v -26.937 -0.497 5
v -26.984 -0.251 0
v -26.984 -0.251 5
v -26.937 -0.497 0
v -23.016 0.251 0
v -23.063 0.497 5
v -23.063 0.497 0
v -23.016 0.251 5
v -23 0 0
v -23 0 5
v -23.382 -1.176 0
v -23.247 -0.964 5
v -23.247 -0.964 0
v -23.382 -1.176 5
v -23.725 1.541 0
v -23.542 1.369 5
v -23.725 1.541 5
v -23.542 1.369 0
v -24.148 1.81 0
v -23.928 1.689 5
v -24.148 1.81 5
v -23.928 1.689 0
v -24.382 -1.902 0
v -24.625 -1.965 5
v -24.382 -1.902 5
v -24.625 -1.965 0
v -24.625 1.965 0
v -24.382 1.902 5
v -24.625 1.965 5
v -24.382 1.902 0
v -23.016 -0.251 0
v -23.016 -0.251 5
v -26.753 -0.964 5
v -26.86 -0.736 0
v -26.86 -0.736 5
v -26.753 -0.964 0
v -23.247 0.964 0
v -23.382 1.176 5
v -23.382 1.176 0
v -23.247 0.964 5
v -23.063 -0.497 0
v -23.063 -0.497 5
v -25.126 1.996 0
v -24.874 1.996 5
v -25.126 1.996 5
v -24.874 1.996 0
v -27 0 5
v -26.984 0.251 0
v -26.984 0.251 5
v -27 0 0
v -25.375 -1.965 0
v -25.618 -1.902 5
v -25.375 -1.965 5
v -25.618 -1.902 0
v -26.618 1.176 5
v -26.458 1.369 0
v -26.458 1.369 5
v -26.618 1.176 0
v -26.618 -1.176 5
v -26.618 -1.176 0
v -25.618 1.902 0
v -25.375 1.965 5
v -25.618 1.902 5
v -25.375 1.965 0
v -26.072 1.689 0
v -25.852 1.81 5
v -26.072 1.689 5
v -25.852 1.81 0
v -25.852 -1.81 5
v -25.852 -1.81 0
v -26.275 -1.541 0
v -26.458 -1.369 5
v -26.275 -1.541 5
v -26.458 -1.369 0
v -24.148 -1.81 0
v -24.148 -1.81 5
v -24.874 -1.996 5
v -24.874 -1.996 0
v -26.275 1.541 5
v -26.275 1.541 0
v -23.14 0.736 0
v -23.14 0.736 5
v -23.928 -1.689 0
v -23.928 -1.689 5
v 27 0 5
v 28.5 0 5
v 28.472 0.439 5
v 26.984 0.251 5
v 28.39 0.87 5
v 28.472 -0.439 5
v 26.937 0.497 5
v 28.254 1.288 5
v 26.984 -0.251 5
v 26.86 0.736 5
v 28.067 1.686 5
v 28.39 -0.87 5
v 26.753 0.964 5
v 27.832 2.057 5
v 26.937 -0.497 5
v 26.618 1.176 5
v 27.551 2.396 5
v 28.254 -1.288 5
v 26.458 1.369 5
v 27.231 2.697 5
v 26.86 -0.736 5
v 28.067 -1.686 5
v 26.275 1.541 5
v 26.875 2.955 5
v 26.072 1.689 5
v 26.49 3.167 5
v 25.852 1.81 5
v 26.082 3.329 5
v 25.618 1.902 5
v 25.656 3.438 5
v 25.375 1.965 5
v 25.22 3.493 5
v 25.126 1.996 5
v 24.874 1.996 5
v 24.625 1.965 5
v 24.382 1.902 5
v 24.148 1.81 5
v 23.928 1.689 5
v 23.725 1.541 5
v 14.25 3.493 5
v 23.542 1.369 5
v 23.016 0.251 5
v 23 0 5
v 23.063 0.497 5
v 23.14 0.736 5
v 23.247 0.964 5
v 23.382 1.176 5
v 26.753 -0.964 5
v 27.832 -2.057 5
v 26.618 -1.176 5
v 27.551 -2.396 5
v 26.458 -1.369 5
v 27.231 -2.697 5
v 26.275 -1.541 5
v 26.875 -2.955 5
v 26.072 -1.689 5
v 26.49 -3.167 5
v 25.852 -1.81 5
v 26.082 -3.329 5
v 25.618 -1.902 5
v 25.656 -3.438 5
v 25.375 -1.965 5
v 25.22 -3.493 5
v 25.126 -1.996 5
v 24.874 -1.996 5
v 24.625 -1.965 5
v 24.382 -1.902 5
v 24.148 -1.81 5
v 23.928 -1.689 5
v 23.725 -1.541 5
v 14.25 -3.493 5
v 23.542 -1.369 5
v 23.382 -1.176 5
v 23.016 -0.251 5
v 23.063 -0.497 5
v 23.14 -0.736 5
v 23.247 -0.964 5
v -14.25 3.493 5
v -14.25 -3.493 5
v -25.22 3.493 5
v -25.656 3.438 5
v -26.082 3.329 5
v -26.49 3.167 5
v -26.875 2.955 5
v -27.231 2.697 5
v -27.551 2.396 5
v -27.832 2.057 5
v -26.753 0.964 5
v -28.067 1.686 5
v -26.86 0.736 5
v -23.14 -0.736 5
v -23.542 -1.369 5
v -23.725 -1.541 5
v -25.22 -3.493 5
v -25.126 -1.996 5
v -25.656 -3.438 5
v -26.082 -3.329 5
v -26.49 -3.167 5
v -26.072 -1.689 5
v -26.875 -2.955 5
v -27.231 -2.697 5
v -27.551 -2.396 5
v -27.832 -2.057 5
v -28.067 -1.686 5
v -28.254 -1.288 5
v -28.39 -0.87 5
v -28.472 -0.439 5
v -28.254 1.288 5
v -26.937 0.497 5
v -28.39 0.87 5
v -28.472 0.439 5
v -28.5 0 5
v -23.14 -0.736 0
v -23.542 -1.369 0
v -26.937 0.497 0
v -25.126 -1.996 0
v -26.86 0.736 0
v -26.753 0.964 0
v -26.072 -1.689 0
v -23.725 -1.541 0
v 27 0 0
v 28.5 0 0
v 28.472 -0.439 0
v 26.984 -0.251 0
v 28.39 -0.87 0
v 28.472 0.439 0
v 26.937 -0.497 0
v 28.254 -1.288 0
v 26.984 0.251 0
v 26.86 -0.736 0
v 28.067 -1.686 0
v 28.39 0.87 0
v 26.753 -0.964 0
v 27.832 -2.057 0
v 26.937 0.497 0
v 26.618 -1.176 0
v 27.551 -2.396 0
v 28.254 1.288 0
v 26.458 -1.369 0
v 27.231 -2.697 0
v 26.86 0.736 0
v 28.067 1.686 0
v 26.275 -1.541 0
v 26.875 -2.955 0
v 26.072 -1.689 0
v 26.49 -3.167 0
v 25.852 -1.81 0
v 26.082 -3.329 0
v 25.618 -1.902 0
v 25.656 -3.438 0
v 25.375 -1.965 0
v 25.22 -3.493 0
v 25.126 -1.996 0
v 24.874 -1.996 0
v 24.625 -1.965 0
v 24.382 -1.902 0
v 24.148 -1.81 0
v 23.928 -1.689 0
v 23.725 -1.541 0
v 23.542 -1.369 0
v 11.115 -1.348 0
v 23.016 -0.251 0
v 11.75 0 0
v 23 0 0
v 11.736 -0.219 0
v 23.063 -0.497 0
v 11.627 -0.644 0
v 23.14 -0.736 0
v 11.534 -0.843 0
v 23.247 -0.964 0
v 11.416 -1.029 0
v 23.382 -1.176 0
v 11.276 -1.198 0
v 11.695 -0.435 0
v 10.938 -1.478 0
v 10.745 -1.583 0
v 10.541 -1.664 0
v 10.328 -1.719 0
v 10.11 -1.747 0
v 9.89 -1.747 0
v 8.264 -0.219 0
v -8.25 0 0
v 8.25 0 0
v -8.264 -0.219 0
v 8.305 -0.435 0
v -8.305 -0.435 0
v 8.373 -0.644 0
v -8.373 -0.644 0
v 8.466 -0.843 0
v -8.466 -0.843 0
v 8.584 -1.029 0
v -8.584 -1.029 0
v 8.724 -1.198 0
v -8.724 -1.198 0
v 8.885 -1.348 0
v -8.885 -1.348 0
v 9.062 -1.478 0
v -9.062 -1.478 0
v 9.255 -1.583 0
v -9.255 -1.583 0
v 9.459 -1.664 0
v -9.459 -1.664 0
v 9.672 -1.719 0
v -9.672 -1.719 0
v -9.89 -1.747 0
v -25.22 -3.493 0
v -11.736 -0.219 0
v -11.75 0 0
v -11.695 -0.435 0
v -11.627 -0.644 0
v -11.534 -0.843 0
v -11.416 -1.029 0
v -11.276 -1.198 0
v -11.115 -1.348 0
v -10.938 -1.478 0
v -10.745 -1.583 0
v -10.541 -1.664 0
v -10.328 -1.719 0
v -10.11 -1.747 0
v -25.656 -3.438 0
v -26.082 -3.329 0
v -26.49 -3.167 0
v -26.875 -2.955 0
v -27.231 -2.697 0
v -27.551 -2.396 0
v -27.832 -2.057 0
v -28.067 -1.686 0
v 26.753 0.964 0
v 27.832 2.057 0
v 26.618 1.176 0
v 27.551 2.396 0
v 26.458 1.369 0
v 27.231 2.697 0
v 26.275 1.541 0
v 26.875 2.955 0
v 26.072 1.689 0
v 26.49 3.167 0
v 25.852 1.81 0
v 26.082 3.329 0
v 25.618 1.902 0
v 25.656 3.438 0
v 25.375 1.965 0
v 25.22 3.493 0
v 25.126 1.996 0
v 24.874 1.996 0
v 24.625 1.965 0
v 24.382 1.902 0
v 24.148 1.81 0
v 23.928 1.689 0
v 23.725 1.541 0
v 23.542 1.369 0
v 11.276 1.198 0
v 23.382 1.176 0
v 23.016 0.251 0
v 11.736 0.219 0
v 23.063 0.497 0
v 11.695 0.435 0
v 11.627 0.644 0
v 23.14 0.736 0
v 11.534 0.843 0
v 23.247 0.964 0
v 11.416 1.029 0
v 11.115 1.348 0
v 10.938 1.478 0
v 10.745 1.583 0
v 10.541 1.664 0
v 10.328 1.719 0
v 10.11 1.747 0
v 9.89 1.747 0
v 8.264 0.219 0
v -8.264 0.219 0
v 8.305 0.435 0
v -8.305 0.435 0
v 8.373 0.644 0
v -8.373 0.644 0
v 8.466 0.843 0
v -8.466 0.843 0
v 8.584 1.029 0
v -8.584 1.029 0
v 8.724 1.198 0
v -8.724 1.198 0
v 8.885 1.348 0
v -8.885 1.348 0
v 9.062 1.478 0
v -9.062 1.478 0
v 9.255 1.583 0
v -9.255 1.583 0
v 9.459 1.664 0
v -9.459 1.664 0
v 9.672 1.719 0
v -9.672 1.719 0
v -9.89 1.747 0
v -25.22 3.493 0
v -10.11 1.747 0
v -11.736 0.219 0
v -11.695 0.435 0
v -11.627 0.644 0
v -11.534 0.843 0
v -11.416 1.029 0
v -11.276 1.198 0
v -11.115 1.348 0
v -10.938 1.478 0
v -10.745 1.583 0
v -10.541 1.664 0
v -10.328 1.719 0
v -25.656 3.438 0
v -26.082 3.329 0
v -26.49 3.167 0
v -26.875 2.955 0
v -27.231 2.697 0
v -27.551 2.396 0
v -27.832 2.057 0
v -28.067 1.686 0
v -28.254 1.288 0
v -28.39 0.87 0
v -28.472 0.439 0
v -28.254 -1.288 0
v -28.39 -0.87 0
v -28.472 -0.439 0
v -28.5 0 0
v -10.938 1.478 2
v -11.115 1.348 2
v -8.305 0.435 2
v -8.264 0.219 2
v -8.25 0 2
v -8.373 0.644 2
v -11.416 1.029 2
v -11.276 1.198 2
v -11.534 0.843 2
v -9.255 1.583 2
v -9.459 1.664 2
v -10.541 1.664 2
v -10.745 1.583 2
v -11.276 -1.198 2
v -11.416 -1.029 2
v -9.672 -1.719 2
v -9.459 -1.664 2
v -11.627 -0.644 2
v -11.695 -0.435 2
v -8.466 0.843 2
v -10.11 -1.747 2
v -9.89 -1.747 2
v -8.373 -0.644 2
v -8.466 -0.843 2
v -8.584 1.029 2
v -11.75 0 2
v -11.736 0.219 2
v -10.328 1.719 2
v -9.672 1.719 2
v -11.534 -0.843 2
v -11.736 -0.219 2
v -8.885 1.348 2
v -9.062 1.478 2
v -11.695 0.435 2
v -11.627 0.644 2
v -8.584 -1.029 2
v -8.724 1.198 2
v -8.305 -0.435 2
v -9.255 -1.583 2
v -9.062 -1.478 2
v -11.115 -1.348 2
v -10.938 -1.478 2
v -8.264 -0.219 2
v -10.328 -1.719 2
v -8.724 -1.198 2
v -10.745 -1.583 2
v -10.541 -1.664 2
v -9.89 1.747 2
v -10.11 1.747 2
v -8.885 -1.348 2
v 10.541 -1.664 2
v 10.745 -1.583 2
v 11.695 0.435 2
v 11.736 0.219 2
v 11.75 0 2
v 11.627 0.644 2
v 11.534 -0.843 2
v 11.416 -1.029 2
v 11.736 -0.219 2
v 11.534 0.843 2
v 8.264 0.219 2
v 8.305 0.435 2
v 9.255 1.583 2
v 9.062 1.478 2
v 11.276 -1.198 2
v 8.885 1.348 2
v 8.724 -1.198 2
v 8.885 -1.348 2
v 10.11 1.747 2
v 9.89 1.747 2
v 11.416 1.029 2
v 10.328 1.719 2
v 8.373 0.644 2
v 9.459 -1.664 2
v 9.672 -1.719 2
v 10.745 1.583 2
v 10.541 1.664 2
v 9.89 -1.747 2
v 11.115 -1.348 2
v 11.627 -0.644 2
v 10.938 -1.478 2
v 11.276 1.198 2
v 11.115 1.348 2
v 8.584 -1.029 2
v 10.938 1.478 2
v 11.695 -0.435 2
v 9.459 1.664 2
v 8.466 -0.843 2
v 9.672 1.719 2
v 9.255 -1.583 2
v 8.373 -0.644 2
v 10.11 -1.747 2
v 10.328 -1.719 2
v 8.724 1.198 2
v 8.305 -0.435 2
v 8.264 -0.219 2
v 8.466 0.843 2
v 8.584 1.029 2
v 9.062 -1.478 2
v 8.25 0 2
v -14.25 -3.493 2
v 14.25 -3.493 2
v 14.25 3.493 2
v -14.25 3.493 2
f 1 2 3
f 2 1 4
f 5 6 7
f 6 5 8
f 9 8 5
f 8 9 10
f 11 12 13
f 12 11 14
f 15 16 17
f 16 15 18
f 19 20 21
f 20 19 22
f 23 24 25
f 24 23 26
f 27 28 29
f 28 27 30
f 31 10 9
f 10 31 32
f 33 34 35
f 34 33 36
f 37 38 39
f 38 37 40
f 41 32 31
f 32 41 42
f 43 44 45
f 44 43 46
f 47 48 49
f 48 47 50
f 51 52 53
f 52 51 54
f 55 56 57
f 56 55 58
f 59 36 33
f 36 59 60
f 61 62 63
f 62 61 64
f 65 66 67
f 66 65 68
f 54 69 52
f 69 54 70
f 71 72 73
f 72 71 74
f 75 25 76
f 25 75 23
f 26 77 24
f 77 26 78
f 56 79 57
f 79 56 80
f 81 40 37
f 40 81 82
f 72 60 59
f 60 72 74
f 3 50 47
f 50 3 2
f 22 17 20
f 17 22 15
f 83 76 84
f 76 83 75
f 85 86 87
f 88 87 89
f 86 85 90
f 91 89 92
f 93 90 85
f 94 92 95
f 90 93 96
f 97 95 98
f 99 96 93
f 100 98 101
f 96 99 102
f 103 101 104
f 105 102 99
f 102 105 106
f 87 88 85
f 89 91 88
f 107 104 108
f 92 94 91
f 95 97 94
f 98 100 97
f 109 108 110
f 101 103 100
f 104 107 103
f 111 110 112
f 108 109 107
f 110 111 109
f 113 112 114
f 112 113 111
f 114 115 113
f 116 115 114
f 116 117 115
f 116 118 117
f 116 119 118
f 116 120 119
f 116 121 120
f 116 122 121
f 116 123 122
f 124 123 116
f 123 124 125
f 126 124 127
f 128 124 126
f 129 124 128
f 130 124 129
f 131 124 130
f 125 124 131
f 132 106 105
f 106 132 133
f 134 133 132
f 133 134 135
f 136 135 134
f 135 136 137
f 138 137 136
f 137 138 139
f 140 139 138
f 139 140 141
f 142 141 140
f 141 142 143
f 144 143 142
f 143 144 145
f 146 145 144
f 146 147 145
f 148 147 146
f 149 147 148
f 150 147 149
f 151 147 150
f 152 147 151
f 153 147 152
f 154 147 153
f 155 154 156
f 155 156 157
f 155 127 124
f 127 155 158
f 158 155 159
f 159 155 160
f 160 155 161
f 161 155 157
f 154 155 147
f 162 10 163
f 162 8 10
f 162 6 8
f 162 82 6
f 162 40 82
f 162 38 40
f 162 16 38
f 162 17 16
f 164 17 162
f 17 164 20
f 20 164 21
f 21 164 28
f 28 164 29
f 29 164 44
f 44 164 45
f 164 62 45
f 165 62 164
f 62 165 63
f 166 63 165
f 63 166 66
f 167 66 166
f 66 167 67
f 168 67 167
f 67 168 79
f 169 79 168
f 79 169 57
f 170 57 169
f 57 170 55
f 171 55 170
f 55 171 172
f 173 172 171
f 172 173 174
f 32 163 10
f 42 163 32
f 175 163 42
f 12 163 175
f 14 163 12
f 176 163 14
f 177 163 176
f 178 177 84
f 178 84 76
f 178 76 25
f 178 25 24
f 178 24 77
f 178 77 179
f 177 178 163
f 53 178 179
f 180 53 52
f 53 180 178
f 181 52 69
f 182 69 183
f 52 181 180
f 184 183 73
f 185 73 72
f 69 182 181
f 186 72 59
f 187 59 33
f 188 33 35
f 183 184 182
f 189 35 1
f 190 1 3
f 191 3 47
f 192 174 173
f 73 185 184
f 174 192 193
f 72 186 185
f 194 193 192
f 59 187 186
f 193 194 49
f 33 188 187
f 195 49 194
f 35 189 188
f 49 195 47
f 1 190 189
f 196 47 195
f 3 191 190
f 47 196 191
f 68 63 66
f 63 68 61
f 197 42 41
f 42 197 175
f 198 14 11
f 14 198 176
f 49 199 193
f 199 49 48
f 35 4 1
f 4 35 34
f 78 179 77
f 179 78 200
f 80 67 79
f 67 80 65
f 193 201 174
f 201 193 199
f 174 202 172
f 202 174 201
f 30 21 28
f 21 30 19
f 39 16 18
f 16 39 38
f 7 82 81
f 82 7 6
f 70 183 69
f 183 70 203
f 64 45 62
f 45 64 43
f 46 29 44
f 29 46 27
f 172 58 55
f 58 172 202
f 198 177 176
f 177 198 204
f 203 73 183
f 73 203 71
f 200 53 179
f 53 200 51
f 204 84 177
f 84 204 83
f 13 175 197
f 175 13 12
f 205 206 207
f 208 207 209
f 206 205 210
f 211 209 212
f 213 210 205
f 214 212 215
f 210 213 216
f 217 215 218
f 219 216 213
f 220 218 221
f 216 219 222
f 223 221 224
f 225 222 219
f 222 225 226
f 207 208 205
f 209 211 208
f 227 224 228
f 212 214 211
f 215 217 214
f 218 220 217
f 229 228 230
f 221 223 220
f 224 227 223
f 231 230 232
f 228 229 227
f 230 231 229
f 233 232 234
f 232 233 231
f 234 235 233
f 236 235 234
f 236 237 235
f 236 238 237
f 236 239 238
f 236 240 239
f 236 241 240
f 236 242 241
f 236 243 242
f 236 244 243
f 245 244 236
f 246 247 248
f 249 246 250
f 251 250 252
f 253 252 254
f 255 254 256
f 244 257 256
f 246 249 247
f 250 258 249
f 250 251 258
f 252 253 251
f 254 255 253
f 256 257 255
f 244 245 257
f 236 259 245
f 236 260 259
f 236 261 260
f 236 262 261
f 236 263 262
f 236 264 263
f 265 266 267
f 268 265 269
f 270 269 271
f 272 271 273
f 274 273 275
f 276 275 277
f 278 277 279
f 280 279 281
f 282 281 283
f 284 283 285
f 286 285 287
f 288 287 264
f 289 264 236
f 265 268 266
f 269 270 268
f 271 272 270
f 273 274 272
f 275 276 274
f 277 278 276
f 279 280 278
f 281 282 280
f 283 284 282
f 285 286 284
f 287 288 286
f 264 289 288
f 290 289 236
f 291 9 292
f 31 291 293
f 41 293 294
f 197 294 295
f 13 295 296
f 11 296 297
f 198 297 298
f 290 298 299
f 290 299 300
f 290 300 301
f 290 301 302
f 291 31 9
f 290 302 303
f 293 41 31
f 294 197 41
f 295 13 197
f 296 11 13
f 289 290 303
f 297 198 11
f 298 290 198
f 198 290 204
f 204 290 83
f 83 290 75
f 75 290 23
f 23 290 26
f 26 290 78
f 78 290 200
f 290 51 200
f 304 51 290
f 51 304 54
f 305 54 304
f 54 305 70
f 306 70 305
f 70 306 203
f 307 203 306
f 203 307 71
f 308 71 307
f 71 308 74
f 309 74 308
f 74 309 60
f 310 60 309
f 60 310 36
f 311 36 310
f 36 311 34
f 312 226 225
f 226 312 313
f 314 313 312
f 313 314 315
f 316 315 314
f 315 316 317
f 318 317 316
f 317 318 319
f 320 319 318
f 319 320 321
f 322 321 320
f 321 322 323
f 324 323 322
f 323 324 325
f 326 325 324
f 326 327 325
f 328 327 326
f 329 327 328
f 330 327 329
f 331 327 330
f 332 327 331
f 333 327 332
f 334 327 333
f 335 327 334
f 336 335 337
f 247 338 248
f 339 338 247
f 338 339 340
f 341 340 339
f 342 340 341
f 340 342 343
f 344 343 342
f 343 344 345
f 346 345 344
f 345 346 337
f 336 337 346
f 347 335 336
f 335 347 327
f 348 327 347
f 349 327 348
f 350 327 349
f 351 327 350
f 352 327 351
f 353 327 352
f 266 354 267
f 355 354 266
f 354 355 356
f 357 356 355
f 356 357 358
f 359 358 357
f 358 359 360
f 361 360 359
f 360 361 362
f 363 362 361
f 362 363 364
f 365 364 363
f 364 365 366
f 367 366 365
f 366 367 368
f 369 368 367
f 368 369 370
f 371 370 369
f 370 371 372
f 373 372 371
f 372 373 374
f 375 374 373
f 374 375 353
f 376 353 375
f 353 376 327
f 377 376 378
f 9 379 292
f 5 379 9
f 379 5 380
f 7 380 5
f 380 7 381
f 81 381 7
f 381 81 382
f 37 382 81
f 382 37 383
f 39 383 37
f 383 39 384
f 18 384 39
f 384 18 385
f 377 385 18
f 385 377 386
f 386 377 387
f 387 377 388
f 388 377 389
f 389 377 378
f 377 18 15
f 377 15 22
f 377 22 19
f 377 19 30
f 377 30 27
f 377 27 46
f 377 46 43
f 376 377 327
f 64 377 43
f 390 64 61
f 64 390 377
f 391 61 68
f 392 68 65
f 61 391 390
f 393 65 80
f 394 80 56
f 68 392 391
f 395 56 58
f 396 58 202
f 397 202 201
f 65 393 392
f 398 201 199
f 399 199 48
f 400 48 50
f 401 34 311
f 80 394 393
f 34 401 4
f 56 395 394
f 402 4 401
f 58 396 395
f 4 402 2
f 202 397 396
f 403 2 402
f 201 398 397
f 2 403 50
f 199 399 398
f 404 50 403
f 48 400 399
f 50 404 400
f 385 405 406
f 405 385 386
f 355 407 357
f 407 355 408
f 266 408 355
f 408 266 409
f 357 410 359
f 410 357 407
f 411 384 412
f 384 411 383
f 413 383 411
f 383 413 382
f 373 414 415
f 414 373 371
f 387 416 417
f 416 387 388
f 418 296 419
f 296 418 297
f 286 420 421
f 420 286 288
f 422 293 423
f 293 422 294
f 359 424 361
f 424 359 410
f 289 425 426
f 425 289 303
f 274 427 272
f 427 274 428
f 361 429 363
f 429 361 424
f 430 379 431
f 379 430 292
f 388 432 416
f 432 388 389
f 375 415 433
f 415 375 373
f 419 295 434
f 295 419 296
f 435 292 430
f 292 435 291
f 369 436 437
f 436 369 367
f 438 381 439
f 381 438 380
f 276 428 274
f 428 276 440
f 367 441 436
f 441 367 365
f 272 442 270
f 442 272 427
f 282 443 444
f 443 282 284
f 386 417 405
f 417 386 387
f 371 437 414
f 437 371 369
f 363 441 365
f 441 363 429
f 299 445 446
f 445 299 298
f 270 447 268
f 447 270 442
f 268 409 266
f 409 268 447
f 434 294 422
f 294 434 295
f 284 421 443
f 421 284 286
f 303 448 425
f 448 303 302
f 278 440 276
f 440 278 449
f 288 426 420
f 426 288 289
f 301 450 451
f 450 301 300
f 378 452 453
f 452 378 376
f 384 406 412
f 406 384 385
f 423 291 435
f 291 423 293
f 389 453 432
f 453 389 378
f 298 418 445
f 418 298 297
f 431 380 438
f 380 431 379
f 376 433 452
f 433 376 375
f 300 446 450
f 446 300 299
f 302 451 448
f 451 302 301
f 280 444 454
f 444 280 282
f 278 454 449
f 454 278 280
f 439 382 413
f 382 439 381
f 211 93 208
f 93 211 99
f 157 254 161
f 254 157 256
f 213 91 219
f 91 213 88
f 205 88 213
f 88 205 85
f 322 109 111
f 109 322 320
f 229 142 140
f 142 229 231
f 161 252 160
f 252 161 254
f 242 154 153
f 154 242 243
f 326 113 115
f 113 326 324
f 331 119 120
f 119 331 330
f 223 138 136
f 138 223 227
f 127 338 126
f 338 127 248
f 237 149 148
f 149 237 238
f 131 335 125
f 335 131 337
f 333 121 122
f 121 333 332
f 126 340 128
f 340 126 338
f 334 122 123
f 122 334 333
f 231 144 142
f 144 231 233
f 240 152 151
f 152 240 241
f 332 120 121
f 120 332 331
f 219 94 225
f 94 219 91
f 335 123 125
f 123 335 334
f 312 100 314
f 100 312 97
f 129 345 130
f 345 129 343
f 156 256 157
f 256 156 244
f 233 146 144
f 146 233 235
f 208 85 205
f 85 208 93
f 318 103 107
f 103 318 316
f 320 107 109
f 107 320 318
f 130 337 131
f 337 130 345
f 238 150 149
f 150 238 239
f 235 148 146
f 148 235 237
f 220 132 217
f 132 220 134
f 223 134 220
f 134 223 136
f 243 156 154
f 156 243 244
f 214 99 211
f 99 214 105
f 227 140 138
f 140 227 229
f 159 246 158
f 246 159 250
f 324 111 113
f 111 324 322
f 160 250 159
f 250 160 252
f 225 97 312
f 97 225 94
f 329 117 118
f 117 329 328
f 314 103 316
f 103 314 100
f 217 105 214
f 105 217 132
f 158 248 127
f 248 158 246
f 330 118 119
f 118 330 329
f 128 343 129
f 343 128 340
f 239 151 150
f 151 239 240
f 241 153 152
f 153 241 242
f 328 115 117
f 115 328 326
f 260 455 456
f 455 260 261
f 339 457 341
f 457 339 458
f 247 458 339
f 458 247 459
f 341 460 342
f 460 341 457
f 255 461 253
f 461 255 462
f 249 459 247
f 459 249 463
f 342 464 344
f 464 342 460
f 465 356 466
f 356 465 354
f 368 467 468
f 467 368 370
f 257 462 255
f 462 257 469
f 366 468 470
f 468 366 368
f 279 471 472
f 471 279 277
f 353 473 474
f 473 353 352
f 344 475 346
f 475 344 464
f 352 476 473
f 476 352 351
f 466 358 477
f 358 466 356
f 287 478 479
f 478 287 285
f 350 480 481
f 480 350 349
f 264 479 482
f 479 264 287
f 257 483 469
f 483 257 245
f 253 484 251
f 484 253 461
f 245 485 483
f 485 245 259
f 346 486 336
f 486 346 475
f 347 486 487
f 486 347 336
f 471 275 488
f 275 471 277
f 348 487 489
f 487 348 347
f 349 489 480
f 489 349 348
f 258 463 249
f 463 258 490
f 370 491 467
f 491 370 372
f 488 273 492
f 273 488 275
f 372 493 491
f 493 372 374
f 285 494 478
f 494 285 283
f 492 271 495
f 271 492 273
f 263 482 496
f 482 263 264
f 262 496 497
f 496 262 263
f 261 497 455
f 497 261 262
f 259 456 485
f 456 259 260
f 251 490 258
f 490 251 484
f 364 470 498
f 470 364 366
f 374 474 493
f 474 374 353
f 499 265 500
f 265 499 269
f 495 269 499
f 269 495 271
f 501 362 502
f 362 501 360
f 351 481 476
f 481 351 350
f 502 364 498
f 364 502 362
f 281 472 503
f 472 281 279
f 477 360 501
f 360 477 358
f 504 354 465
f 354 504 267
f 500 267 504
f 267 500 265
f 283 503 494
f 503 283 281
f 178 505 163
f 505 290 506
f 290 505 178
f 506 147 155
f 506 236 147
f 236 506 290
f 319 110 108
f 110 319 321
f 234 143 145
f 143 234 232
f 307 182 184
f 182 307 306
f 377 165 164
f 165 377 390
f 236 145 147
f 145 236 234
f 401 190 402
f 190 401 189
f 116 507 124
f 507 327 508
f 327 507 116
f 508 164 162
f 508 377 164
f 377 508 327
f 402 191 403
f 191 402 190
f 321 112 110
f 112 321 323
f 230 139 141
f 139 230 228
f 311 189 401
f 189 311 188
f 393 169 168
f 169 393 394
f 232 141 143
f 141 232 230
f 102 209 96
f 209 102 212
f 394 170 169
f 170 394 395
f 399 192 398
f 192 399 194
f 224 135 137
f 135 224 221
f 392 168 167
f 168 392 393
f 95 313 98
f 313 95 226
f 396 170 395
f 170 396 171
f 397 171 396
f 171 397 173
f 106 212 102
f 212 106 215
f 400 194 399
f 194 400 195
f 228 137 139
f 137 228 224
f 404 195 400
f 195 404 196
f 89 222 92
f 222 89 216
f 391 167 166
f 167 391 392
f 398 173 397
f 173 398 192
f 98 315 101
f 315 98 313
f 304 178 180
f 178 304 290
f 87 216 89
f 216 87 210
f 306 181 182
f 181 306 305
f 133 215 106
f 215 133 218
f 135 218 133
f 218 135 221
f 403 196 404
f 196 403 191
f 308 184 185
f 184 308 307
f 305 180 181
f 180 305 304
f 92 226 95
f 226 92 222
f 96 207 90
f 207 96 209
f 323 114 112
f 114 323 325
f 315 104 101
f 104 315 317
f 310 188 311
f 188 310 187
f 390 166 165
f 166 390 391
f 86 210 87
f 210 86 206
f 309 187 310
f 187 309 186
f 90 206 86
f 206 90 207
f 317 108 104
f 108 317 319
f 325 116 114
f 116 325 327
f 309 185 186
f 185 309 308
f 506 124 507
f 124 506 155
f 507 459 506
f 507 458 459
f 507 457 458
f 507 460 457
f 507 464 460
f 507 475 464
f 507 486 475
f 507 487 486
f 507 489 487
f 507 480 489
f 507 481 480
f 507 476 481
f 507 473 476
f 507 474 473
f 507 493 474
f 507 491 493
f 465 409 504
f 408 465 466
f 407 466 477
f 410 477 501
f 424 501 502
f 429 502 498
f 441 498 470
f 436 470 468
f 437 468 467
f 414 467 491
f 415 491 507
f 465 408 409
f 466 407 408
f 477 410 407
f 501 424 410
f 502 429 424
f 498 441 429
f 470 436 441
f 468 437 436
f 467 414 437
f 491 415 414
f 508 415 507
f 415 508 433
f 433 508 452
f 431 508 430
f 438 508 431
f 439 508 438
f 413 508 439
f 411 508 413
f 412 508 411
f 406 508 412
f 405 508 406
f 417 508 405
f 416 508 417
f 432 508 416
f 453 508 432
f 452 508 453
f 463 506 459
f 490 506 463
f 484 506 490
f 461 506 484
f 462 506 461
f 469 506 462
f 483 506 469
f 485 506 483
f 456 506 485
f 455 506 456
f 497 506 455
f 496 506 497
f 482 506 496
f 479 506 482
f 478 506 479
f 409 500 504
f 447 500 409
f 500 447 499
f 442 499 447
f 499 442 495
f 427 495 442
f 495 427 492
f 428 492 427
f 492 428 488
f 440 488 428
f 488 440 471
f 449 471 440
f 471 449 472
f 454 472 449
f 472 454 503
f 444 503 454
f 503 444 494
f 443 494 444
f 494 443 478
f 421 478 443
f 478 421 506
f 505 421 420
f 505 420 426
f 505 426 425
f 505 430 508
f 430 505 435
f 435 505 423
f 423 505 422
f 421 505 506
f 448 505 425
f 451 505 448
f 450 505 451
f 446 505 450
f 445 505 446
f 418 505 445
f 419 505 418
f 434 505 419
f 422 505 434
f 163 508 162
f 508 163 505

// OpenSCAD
WIDTH = 40;

ROD_MOUNT_DIA = 7;
ROD_MOUNT_THICKNESS = 5;
ROD_HOLE_SPACING = 50;
ROD_HOLE_DIA = 4;

BAR_THICKNESS = 2;
BAR_WIDTH = 7;
BAR_LENGTH = 28.5;

MOUNT_HOLE_SPACING = 20;
MOUNT_HOLE_DIA = 3.5;

$fn = 50;

difference() {
  hull() {
    for(i = [-1, 1]) {
      translate([i * ROD_HOLE_SPACING/2, 0, 0])
      cylinder(d = ROD_MOUNT_DIA, h = ROD_MOUNT_THICKNESS);

      translate([i * BAR_LENGTH/2, 0, 0])
      cylinder(d = BAR_WIDTH, h = ROD_MOUNT_THICKNESS);
    }
  }

  #translate([-BAR_LENGTH/2, -BAR_WIDTH/2, BAR_THICKNESS])
  cube([BAR_LENGTH, BAR_WIDTH, ROD_MOUNT_THICKNESS]);

  #for(i = [-1, 1]) {
    translate([i * ROD_HOLE_SPACING/2, 0, 0])
    cylinder(d = ROD_HOLE_DIA, h = ROD_MOUNT_THICKNESS);

    translate([i * MOUNT_HOLE_SPACING/2, 0, 0])
    cylinder(d = MOUNT_HOLE_DIA, h = ROD_MOUNT_THICKNESS);
  }
}
